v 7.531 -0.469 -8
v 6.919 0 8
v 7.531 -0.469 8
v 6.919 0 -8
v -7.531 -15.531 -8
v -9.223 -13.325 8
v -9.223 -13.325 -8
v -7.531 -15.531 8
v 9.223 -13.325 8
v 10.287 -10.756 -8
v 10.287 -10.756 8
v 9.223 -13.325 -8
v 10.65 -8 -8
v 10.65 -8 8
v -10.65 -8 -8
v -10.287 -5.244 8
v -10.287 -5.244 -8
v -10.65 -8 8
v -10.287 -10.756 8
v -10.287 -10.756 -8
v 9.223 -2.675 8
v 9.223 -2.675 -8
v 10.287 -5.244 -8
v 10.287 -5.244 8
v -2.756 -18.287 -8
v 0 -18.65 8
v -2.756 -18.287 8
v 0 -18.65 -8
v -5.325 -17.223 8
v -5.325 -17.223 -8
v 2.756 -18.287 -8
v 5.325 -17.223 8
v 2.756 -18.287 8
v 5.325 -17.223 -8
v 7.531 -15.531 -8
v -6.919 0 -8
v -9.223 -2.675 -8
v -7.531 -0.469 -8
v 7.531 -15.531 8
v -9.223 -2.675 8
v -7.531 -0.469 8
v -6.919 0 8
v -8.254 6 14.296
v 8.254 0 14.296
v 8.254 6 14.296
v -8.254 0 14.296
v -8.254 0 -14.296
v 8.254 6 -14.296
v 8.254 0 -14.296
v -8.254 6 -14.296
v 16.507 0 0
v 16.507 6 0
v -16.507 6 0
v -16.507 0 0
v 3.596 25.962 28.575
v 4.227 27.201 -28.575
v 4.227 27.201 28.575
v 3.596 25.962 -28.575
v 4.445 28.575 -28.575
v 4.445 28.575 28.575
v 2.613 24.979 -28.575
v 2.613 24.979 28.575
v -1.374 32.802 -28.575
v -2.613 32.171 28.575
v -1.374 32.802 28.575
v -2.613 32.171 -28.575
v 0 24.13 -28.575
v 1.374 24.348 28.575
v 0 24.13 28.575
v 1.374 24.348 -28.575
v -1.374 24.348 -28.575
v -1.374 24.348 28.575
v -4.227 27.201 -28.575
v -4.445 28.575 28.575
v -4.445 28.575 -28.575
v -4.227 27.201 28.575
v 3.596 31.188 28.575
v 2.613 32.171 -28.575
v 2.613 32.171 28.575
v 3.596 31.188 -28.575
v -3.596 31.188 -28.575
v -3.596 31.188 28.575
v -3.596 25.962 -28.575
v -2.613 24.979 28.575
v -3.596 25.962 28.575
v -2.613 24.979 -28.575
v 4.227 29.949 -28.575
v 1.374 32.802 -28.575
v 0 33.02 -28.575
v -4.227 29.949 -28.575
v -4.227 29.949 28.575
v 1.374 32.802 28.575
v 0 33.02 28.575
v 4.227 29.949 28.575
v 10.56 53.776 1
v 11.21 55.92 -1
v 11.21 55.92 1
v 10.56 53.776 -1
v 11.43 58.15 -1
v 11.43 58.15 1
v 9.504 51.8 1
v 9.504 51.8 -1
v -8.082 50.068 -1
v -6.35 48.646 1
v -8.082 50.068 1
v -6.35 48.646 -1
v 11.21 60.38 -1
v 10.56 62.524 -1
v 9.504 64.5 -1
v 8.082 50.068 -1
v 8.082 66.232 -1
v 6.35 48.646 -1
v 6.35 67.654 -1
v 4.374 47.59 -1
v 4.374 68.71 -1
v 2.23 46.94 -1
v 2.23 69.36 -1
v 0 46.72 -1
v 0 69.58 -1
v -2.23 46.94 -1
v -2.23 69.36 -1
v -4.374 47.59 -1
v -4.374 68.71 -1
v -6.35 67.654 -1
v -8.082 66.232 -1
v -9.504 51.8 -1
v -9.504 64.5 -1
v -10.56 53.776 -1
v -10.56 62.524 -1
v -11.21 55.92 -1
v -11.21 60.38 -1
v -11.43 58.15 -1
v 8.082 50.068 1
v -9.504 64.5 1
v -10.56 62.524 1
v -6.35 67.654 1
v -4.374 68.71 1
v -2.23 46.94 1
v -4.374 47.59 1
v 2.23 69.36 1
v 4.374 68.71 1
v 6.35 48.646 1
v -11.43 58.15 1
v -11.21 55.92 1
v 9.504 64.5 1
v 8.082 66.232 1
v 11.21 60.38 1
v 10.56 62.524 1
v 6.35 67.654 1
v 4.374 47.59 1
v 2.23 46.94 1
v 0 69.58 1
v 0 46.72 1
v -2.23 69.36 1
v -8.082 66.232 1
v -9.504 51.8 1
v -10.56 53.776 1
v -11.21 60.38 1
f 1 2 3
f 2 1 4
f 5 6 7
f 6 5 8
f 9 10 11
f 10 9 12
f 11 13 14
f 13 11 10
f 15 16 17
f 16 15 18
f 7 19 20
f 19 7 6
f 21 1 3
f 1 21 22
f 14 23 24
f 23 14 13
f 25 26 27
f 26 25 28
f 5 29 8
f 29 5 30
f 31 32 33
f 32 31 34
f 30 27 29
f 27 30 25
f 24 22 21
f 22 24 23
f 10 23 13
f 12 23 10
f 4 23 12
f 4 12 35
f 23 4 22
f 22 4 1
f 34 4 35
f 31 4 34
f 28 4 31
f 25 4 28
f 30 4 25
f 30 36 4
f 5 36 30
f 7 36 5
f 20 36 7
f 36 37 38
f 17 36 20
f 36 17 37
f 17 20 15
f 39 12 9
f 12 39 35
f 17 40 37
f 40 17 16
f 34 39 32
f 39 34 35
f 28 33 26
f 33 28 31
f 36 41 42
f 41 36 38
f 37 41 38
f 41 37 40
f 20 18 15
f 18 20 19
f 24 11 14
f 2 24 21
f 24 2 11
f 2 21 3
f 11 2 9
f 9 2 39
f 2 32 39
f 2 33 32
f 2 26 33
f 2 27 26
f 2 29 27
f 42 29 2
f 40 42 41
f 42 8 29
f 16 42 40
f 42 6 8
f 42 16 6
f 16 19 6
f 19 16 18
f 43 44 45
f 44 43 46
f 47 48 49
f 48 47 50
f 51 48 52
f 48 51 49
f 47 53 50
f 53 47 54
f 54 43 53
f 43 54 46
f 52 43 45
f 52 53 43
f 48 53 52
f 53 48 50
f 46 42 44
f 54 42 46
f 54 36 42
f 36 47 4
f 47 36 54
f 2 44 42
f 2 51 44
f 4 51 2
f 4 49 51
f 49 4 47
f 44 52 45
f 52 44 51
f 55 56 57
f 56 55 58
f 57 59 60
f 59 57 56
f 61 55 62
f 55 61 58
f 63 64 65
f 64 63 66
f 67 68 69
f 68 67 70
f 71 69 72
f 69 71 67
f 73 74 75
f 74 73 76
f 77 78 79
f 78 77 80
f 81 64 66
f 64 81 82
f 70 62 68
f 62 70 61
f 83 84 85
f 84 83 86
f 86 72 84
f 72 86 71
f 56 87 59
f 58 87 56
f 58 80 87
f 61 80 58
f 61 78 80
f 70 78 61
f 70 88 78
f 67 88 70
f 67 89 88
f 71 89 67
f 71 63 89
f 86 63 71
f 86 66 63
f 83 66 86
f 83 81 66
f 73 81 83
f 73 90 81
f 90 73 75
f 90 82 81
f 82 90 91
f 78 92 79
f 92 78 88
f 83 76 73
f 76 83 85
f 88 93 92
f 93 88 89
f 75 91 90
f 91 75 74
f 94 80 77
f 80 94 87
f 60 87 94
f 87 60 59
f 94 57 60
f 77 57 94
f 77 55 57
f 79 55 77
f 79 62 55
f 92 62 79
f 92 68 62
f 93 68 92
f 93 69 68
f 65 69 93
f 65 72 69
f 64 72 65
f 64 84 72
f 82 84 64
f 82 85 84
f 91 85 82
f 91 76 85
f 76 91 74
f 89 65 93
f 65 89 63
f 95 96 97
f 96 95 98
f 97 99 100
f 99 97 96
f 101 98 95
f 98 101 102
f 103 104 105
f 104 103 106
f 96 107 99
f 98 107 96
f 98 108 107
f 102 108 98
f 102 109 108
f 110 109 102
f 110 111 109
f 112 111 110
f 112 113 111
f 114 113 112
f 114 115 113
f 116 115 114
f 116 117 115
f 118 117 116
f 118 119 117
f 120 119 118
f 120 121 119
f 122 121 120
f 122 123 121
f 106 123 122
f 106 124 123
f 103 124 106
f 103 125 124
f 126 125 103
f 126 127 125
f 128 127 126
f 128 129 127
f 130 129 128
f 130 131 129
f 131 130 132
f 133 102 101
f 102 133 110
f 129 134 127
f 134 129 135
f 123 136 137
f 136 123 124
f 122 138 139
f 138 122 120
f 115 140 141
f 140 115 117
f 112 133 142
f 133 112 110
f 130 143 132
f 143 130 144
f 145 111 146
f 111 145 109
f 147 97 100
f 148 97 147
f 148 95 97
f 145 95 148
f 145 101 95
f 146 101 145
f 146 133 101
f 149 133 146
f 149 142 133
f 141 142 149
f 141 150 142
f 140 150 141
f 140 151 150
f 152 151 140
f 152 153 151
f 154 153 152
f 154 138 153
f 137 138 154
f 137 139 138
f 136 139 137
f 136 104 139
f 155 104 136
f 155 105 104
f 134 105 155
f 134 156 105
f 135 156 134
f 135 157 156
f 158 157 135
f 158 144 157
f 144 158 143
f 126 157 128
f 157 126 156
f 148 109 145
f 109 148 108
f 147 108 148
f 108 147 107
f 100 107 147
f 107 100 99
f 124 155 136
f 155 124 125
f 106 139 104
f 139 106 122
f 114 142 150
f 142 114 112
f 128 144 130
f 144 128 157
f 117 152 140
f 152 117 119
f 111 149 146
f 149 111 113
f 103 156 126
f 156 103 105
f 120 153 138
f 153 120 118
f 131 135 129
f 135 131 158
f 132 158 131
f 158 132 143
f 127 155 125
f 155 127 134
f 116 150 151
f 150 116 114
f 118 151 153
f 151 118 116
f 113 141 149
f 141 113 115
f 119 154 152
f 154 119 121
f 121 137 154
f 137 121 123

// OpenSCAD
// Auto-generated by scripts/author_from_manifest.py (Phase D.3).
// Source: data/phase_d_manifest.json (sku_intent='reliable-f180-upright-200f').
// Do not hand-edit — regenerate from the manifest.
//
// @part reliable_f180_upright_200f
// @kind sprinkler_head
// @category head.upright.k80
// @display-name "Reliable F1-80 Upright K8.0 SR 200°F"
// @mfg reliable_automatic_sprinkler
// @mfg-pn F1-80
// @listing UL FM
// @hazard-classes OH1 OH2
// @price-usd 16.10
// @install-minutes 8
// @crew journeyman
// @k-factor 8
// @orientation upright
// @response standard
// @temperature 200F
// @param size_in number default=0.5 label="Size" unit="in"
// @port inlet position=[0,0.014,0] direction=[0,1,0] style=NPT_threaded size_in=0.5 role=drop

size_in = 0.5;
k_factor = 8.0;

length_mm   = 57.15;
body_dia_mm = 25.40;
thread_od   = 21.3;
thread_len  = 16;
deflector_d = body_dia_mm * 0.9;

rotate([180,0,0]) union() {
    translate([0, thread_len/2, 0])
        cylinder(h = thread_len, d = thread_od, center = true, $fn = 24);
    translate([0, -3, 0])
        rotate([90, 0, 0])
        cylinder(h = 6, d = thread_od * 1.55, $fn = 6, center = true);
    translate([0, -length_mm/2, 0])
        cylinder(h = length_mm, d = body_dia_mm * 0.35, center = true, $fn = 20);
    translate([0, -length_mm - 1, 0])
        cylinder(h = 2, d = deflector_d, center = true, $fn = 32);
}
